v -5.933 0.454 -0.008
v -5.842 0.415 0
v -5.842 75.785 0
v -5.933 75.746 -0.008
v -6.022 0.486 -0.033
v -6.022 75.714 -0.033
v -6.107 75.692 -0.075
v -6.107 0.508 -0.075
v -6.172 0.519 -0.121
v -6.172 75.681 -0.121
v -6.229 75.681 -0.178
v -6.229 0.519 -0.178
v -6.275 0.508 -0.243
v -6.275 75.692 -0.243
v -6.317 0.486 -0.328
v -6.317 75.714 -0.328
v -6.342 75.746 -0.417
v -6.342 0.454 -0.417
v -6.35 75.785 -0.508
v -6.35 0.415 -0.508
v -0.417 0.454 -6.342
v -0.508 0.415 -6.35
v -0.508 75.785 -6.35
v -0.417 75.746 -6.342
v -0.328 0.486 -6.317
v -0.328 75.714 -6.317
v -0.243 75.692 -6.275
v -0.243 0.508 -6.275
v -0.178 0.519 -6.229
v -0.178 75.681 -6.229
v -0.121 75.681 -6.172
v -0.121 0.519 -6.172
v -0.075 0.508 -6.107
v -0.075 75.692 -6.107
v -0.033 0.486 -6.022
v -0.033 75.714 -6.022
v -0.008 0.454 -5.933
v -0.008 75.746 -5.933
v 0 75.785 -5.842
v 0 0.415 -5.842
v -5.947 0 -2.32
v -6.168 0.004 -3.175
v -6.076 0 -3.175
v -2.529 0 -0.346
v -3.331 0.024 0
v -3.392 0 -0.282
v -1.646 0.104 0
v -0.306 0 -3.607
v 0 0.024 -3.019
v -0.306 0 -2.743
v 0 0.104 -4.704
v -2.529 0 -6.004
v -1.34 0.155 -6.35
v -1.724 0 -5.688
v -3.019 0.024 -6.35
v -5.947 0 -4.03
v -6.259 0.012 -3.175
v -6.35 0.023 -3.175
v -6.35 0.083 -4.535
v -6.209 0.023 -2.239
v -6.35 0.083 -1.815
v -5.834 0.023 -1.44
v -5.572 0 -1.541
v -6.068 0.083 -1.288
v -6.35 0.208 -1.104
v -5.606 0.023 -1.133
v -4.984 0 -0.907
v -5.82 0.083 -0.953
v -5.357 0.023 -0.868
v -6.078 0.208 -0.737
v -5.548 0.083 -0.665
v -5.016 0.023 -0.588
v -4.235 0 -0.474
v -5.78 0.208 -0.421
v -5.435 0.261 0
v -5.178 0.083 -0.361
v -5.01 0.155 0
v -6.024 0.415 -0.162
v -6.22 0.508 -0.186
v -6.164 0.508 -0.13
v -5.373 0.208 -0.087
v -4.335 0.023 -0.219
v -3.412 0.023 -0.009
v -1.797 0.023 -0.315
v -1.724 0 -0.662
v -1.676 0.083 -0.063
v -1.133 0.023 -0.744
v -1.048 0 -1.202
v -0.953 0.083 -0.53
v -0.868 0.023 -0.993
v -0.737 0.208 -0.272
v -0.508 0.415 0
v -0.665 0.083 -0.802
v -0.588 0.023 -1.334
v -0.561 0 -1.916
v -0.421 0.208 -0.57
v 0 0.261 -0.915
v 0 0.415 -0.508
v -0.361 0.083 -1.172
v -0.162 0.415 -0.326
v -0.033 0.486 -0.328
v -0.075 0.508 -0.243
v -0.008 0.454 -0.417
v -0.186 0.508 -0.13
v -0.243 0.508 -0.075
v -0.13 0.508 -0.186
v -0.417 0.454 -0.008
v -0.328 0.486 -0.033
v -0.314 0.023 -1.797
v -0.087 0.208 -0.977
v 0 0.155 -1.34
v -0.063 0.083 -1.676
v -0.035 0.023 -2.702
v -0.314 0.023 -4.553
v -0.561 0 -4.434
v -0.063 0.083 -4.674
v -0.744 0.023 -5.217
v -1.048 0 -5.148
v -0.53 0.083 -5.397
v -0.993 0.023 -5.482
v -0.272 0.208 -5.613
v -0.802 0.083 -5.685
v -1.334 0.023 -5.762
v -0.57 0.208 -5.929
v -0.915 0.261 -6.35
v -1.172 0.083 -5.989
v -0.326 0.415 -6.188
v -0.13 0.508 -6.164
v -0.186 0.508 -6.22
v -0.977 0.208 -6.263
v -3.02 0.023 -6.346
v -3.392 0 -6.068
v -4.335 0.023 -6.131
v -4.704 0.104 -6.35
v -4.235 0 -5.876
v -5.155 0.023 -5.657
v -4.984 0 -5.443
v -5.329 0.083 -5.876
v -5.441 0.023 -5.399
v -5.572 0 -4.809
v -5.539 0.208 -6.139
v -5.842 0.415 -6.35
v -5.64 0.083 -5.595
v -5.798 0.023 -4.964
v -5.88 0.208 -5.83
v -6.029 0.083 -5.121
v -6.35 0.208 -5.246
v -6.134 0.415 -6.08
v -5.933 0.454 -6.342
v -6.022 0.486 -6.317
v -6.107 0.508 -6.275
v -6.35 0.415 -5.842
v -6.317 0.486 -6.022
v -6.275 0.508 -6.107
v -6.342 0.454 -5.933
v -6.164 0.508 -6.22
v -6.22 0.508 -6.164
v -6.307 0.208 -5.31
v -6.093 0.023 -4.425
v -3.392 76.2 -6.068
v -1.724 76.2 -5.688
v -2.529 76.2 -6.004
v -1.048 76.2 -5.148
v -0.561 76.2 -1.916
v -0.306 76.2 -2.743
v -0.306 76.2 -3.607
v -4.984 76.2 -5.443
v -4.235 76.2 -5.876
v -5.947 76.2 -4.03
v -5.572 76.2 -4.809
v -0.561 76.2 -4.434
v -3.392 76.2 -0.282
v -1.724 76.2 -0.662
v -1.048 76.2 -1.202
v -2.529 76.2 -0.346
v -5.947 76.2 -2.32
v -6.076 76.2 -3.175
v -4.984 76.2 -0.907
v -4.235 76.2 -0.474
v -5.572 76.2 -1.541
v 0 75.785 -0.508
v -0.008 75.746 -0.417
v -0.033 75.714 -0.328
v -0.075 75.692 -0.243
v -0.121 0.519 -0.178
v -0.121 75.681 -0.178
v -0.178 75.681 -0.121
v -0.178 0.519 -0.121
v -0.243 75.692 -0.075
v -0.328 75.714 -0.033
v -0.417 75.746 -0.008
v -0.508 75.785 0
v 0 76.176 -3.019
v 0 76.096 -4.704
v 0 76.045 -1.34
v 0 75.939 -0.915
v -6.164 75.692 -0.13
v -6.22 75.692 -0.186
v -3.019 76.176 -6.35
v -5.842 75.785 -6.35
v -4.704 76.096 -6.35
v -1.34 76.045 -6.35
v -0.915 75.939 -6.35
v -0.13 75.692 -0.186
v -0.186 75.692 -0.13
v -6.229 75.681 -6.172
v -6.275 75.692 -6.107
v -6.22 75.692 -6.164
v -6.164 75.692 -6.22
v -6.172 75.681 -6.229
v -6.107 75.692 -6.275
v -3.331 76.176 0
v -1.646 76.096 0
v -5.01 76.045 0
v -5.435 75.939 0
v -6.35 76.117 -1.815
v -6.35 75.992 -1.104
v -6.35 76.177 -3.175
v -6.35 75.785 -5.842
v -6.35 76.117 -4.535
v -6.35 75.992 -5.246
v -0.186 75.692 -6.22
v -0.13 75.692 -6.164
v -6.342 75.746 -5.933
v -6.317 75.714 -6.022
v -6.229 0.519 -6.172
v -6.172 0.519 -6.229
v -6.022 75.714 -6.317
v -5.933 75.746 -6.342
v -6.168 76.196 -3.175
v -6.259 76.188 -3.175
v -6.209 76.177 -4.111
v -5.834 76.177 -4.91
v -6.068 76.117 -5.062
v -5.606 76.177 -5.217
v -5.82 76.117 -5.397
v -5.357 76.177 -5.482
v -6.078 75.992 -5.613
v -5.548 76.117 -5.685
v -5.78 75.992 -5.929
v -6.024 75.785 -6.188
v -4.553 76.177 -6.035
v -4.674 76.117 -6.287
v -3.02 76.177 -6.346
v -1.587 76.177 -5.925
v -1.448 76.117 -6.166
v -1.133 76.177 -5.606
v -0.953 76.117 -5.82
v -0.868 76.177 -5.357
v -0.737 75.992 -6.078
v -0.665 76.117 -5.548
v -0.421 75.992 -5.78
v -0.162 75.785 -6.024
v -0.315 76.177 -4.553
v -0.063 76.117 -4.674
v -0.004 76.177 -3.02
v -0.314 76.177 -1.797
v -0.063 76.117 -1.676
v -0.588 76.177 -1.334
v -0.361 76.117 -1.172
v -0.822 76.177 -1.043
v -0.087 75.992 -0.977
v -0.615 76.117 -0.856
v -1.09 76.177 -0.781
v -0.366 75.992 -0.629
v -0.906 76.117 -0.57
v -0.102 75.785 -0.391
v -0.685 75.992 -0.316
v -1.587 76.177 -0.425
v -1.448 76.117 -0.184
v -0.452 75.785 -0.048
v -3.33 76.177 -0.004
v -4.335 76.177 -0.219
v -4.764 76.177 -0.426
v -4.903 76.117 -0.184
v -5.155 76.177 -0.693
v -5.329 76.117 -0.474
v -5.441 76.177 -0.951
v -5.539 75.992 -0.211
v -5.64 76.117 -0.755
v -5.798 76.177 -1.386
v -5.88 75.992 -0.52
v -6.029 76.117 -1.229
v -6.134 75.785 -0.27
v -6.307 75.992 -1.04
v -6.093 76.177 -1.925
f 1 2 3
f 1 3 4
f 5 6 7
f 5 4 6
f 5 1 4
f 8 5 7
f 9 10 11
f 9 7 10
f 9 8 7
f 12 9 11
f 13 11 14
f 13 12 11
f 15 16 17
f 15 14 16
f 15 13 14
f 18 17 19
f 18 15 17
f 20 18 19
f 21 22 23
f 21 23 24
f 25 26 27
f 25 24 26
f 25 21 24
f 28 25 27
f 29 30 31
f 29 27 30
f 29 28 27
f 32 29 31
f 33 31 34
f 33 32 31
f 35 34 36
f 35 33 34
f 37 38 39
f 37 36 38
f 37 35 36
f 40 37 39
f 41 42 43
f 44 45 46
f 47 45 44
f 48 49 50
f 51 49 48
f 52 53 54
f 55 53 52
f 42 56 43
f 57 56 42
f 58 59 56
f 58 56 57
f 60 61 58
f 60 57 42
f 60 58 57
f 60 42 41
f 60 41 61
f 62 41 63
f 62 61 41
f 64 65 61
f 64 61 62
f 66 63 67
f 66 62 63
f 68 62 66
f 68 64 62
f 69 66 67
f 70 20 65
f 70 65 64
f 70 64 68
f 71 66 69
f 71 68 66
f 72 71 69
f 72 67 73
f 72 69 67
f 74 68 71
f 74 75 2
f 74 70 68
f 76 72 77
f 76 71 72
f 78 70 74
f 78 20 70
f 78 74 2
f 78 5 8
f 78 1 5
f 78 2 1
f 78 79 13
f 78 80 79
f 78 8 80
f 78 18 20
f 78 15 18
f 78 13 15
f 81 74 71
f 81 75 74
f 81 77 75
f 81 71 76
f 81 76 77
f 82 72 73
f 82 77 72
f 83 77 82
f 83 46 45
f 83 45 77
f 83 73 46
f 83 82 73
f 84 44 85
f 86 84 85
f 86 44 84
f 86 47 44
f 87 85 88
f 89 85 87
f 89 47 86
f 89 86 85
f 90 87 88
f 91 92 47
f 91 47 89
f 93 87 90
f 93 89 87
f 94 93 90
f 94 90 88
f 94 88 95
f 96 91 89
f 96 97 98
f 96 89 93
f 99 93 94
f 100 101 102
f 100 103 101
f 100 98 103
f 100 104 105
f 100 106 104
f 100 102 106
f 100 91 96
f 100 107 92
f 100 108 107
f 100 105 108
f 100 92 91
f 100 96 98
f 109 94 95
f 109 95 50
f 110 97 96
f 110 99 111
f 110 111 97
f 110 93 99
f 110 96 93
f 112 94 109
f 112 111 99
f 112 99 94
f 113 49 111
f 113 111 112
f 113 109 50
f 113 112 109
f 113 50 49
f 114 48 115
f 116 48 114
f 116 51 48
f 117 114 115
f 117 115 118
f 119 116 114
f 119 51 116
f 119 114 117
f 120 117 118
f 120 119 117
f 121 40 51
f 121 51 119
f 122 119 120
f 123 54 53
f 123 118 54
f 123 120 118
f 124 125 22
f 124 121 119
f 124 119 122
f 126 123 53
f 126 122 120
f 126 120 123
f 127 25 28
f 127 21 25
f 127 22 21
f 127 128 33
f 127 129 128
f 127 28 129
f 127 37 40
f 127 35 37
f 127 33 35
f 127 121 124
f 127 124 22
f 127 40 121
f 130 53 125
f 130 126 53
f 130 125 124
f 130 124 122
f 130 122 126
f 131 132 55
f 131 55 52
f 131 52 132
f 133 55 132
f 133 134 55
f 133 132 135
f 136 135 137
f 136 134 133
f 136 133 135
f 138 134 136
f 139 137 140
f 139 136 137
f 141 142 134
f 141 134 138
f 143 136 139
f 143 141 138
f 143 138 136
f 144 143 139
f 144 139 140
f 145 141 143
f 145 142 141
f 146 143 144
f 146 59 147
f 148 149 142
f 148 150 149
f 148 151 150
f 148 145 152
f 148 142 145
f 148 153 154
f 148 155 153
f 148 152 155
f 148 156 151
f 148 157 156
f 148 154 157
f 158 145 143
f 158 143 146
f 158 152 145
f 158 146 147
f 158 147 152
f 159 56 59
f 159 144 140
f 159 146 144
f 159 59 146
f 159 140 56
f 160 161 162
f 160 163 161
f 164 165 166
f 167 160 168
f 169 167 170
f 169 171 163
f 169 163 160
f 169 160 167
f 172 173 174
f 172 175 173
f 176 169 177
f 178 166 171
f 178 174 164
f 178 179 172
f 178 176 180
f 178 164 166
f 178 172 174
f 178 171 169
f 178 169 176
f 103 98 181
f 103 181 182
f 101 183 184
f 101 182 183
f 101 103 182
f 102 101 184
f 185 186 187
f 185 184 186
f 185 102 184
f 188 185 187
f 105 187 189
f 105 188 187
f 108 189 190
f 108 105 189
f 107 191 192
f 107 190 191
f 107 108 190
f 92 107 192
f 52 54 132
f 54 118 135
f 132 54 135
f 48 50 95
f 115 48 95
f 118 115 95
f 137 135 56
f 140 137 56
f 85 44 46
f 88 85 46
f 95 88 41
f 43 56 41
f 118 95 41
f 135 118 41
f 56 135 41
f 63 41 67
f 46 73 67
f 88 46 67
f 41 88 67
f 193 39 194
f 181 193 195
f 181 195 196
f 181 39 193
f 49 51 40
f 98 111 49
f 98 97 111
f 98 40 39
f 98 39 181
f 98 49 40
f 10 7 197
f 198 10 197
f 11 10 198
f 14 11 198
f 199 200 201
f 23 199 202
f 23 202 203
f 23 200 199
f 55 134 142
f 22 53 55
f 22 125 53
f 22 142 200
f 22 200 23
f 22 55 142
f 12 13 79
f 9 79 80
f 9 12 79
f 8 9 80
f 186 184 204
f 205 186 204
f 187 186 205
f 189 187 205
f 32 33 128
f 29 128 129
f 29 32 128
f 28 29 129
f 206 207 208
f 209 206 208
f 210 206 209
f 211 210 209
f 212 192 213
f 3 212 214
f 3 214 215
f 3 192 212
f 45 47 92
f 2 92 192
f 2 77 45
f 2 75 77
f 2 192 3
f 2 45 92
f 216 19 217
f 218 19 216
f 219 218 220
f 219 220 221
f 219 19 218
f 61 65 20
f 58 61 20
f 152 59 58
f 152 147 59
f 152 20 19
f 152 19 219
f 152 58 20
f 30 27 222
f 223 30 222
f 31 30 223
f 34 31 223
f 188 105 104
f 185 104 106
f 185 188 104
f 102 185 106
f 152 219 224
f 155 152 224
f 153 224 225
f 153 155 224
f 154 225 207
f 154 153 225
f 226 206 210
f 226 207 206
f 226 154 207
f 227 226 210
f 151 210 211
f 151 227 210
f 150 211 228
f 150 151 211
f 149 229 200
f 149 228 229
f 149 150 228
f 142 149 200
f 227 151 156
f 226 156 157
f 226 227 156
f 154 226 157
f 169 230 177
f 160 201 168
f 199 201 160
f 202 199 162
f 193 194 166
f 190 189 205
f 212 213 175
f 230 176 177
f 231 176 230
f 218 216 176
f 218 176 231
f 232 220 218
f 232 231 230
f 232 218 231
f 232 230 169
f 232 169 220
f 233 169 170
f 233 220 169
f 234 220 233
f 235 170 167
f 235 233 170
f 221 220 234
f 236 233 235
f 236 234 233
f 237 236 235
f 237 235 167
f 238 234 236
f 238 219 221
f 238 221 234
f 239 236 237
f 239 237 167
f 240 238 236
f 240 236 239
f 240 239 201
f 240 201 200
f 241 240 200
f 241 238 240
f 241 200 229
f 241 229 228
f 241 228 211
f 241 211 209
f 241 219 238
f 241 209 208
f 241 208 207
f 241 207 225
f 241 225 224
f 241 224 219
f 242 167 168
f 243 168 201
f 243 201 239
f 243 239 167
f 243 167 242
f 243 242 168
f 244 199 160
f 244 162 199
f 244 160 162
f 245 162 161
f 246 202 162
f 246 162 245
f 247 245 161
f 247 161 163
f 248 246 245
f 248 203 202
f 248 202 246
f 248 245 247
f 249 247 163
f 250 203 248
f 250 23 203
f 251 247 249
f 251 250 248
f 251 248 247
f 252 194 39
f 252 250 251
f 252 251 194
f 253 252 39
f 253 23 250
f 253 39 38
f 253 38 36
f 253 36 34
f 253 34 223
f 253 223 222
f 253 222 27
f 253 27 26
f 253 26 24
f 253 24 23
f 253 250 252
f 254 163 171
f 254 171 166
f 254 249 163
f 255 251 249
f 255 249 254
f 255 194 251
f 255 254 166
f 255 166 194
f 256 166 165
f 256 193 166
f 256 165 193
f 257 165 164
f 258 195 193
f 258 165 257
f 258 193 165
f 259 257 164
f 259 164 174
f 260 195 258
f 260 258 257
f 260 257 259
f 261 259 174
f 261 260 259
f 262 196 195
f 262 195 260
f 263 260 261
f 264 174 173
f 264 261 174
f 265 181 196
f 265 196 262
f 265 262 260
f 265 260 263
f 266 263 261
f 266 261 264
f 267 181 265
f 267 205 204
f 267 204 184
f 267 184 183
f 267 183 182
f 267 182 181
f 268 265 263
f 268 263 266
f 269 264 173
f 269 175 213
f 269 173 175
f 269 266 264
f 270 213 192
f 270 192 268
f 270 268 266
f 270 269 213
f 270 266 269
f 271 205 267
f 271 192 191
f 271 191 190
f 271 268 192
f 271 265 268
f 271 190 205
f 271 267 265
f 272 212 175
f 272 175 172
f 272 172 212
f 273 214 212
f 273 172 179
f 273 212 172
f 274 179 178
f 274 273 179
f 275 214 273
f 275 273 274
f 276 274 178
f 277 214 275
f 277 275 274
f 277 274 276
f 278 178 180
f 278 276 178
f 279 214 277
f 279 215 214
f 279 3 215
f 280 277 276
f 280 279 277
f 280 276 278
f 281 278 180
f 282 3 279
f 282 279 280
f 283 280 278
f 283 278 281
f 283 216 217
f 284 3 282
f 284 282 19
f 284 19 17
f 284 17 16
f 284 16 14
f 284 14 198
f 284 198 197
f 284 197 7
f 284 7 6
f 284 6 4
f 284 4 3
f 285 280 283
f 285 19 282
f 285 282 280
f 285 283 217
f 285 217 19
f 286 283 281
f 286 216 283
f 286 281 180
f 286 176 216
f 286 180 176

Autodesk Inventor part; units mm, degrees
ref_plane "YZ Plane" through (0, 0, 0) normal (1, 0, 0) x (0, 1, 0)
sketch "Sketch1" plane through (0, 0, 0) normal (0, 1, 0) x (-1, 0, 0)
  line L0 (0.508, 0) -> (5.842, 0)
  line L1 (6.35, -0.508) -> (6.35, -5.842)
  line L2 (5.842, -6.35) -> (0.508, -6.35)
  line L3 (0, -5.842) -> (0, -0.508)
  arc A0 (5.842, -6.35) -> (6.35, -5.842) centre (5.842, -5.842) ccw
  arc A1 (0, -5.842) -> (0.508, -6.35) centre (0.508, -5.842) ccw
  arc A2 (0.508, 0) -> (0, -0.508) centre (0.508, -0.508) ccw
  arc A3 (6.35, -0.508) -> (5.842, 0) centre (5.842, -0.508) ccw
  arc A4 (3.874769, -6.35) -> (6.35, -3.874769) centre (3.175, -3.175) ccw
  arc A5 (0, -3.874769) -> (2.475231, -6.35) centre (3.175, -3.175) ccw
  arc A6 (6.35, -2.475231) -> (3.874769, 0) centre (3.175, -3.175) ccw
  arc A7 (2.475231, 0) -> (0, -2.475231) centre (3.175, -3.175) ccw
  point P0 (0, 0)
  point P1 (6.35, -6.35)
  point P2 (6.35, 0)
  point P3 (0, -6.35)
  dimension "d0" = 6.35
  dimension "d1" = 6.35
  dimension "d2" = 0.508
extrude "Extrusion1" add sketch "Sketch1" along normal blind 76.2
ref_plane "Work Plane1" through (-0.508, 0, -3.175) normal (0, 0, -1) x (-1, 0, 0)
sketch "Sketch2" plane through (-0.508, 0, -3.175) normal (0, 0, -1) x (-1, 0, 0)
  line L0 (-0.508, 0) -> (-0.508, 76.2)
  line L1 (-0.508, 76.2) -> (5.842, 76.2)
  line L2 (5.842, 76.2) -> (5.842, 0)
  line L3 (5.842, 0) -> (-0.508, 0)
  line L4 (2.667, 76.2) -> (2.667, 76.9112)
  line L5 (2.667, 76.9112) -> (6.9342, 76.9112)
  line L6 (2.667, 76.2) -> (5.461, 76.2)
  arc A0 (6.9342, 75.692) -> (5.461, 76.2) centre (5.51465, 73.965444) ccw
  line L7 (6.9342, 76.9112) -> (7.192755, 76.9112)
  line L8 (7.192755, 76.9112) -> (7.192755, 75.441954)
  line L9 (7.192755, 75.441954) -> (6.9342, 75.692)
  dimension "d6" = 0.7112
  dimension "d7" = 4.2672
  dimension "d8" = 1.2192
  dimension "d9" = 2.794
  dimension "d10" = 2.2352
sketch "Sketch2 outline for Revolution1" plane through (-0.508, 0, -3.175) normal (0, 0, -1) x (-1, 0, 0)
  line L0 (2.667, 76.2) -> (5.461, 76.2)
  line L1 (2.667, 76.9112) -> (2.667, 76.2)
  line L2 (6.9342, 76.9112) -> (2.667, 76.9112)
  line L3 (7.192755, 76.9112) -> (6.9342, 76.9112)
  line L4 (7.192755, 75.441954) -> (7.192755, 76.9112)
  line L5 (6.9342, 75.692) -> (7.192755, 75.441954)
  arc A0 (5.461, 76.2) -> (6.9342, 75.692) centre (5.51465, 73.965444) cw
revolve "Revolution1" cut sketch "Sketch2 outline for Revolution1" angle 360 about axis through (-3.175, 76.2, -3.175) along (0, 1, 0)
ref_plane "Work Plane2" through (-3.175, 38.1, -3.175) normal (0, 1, 0) x (1, 0, 0)
mirror "Mirror1" about plane through (-3.175, 38.1, -3.175) normal (0, 1, 0) of "Revolution1"
properties part number "276-3522"
